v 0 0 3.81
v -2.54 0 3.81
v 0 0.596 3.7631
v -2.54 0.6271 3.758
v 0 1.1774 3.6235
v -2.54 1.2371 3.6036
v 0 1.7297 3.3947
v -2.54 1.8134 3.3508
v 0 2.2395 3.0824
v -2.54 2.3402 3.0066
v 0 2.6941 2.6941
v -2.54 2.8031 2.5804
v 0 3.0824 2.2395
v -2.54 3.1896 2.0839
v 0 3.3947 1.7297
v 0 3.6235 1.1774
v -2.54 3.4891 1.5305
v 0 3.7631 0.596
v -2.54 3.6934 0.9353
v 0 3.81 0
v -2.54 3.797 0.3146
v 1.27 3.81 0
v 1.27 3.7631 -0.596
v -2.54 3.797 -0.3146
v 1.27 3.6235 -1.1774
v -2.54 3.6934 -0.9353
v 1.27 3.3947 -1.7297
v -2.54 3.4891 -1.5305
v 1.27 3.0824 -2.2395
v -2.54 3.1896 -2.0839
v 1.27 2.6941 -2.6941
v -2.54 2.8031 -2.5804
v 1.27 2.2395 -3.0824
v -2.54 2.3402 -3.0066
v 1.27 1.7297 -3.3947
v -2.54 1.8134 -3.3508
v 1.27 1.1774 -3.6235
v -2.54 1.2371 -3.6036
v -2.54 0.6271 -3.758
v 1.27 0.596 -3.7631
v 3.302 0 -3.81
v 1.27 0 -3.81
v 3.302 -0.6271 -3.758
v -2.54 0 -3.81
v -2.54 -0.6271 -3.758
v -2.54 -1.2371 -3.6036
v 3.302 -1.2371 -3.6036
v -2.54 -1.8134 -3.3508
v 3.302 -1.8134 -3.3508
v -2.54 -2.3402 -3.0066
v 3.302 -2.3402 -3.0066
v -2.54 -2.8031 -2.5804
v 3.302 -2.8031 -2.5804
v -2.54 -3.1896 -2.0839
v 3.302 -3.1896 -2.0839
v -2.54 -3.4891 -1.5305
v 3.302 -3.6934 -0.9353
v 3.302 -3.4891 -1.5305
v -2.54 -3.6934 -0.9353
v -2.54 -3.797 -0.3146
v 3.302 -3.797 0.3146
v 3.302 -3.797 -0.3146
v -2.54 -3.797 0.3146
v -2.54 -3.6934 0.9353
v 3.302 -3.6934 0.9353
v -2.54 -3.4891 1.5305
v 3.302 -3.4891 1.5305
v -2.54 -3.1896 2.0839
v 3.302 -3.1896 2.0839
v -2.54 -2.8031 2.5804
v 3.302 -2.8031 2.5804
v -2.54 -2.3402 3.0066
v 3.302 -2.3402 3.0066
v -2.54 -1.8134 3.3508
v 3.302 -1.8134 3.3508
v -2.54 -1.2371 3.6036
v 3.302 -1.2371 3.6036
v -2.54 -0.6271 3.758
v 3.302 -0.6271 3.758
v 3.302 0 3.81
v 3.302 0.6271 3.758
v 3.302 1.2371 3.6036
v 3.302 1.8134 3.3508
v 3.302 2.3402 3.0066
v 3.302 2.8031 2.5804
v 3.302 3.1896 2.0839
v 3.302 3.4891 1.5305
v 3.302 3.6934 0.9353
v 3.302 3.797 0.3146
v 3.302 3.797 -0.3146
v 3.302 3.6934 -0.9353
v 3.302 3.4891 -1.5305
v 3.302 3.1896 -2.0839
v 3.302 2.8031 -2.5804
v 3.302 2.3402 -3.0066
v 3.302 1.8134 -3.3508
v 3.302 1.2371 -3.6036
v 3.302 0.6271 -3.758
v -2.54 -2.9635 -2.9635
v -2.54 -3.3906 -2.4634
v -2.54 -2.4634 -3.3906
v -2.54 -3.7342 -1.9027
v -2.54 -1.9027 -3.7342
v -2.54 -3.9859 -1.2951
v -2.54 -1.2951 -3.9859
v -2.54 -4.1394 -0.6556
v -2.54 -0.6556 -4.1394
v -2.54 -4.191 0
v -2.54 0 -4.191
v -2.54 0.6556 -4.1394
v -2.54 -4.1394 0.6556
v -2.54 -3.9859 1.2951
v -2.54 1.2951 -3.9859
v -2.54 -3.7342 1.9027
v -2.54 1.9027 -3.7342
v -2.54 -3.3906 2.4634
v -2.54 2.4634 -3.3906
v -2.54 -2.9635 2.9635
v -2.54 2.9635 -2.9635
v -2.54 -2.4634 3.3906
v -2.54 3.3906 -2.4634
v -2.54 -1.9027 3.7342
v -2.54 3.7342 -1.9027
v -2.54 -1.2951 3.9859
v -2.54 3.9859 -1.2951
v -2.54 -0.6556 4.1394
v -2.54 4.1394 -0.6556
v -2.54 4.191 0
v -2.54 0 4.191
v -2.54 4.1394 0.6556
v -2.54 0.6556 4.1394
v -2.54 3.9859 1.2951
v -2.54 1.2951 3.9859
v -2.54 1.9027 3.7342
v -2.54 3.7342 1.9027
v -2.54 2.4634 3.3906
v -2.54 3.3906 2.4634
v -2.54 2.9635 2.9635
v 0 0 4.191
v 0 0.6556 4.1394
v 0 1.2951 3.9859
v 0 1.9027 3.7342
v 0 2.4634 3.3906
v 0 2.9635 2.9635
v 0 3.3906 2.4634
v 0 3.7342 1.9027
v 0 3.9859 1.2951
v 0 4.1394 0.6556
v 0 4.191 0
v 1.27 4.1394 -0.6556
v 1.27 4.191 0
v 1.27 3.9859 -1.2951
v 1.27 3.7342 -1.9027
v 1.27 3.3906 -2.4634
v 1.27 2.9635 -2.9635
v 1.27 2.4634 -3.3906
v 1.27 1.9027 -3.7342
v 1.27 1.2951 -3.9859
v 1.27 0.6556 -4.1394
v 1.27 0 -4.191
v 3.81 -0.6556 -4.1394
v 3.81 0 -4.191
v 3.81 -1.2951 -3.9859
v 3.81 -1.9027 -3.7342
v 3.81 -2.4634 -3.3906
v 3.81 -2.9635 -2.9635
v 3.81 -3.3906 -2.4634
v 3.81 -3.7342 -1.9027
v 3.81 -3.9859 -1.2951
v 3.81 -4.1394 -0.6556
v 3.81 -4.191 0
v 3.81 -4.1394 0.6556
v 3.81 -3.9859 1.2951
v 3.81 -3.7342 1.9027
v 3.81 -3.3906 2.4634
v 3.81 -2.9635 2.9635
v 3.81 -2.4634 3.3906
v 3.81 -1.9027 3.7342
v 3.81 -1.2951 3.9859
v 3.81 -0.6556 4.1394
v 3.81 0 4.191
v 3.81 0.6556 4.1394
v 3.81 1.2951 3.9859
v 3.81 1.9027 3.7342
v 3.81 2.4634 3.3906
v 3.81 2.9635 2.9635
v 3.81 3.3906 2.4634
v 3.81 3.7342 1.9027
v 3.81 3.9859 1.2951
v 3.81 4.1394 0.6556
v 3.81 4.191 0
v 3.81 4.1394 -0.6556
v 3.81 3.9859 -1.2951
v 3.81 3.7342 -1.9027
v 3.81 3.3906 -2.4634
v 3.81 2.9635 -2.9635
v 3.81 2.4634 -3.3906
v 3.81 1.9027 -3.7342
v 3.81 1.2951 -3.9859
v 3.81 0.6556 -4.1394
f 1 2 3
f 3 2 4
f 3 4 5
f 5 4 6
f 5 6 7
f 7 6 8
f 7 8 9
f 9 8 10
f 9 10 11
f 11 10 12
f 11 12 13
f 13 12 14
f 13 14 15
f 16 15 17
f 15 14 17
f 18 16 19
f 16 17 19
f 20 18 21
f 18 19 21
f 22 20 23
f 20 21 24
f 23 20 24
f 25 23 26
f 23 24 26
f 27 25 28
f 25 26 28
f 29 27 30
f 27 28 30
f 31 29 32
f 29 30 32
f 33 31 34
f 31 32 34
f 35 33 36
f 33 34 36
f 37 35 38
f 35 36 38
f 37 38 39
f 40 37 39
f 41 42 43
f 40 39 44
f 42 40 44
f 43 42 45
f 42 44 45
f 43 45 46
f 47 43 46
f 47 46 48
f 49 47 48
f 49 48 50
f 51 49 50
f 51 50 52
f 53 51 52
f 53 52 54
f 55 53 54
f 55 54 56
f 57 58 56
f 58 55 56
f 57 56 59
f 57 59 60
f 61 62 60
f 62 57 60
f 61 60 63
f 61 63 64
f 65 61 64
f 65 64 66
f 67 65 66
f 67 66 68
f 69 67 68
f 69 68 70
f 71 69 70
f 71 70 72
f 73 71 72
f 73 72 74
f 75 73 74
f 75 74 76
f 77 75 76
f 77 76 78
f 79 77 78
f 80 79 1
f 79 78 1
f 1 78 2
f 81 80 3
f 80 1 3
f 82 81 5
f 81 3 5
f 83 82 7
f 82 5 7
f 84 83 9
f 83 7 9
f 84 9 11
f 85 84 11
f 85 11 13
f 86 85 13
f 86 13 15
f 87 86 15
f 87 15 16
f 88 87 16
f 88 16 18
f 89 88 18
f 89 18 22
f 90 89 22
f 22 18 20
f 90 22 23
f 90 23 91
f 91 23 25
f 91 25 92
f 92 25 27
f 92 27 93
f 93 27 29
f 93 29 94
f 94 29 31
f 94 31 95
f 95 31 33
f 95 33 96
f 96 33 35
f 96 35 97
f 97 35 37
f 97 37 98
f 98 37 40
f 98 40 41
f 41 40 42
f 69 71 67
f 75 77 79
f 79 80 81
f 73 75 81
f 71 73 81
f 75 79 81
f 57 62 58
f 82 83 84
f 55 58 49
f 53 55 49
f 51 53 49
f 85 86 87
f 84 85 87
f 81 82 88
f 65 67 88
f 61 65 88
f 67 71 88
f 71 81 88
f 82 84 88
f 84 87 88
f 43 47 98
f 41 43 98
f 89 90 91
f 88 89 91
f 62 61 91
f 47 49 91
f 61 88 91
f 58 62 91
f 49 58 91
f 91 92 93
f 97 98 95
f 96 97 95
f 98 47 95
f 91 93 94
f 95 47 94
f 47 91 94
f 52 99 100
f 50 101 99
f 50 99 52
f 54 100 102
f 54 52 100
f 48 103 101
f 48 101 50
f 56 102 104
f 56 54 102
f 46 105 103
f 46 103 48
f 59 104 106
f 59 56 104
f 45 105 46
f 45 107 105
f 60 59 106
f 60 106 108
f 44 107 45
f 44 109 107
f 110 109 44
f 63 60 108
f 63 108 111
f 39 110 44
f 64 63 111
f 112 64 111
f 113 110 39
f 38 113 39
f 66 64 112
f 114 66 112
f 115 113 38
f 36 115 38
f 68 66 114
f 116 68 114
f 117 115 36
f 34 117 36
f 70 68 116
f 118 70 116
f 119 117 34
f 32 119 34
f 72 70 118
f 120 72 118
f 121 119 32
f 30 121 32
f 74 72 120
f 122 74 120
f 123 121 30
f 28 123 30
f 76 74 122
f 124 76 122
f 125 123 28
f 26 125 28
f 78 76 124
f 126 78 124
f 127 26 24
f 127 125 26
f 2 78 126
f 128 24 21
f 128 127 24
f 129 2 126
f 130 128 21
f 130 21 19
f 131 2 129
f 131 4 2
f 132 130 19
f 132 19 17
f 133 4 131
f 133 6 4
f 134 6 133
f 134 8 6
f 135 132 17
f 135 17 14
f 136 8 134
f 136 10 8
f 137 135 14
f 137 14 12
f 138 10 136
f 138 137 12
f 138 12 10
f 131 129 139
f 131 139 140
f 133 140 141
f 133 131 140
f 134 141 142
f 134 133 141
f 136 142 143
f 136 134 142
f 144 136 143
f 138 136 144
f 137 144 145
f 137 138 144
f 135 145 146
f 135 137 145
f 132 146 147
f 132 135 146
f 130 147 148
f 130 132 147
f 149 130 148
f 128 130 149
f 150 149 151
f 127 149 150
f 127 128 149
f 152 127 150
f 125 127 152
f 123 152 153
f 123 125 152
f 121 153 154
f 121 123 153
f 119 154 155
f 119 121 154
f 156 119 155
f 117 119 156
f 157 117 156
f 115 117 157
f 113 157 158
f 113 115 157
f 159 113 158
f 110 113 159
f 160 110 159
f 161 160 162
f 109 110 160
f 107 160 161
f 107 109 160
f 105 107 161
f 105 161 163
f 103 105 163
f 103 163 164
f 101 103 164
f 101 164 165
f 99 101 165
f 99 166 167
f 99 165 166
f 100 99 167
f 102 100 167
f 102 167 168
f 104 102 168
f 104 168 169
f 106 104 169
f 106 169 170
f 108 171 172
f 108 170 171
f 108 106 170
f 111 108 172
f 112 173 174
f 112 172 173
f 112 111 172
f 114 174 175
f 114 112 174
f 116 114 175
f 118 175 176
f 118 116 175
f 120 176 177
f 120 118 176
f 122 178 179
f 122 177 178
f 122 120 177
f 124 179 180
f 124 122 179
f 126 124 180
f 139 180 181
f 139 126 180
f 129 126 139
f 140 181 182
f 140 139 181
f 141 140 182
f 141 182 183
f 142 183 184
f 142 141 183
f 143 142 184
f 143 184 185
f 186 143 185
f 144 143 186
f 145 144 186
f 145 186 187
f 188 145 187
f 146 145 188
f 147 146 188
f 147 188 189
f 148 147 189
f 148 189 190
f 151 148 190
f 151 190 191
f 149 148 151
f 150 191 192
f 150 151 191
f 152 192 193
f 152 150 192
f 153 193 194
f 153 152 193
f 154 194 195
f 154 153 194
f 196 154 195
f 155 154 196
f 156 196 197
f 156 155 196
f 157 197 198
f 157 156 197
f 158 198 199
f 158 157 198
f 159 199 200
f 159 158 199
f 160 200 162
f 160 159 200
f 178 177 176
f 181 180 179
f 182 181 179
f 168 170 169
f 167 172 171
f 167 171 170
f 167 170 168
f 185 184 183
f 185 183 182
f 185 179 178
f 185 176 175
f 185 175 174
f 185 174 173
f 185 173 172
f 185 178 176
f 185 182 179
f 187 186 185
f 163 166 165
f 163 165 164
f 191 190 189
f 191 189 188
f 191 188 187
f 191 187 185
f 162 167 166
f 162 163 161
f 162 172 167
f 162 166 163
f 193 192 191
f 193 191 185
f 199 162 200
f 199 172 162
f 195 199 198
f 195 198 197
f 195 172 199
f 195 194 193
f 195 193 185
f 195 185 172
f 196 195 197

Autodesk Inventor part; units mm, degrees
ref_plane "YZ Plane" through (0, 0, 0) normal (1, 0, 0) x (0, 1, 0)
ref_plane "XZ Plane" through (0, 0, 0) normal (0, 1, 0) x (-1, 0, 0)
ref_plane "XY Plane" through (0, 0, 0) normal (0, 0, 1) x (1, 0, 0)
sketch "Sketch1" plane through (0, 0, 0) normal (1, 0, 0) x (0, 1, 0)
  circle A0 centre (0, 0) radius 4.191
  circle A1 centre (0, 0) radius 3.81
  dimension "d0" = 8.382
  dimension "d1" = 7.62
extrude "Extrusion1" add sketch "Sketch1" along normal blind 1.27
sketch "Sketch2" plane through (0, 0, 0) normal (-1, 0, 0) x (0, 0, 1)
  circle A0 centre (0, 0) radius 4.191
  circle A1 centre (0, 0) radius 3.81
  dimension "d5" = 8.382
  dimension "d4" = 7.62
extrude "Extrusion2" add sketch "Sketch2" along normal blind 1.27
sketch "Sketch3" plane through (-1.27, 0, 0) normal (-1, 0, 0) x (0, 0, 1)
  circle A0 centre (0, 0) radius 4.191
  circle A1 centre (0, 0) radius 3.81
  dimension "d10" = 8.382
  dimension "d9" = 7.62
extrude "Extrusion3" add sketch "Sketch3" along normal blind 1.27
sketch "Sketch4" plane through (1.27, 0, 0) normal (1, 0, 0) x (0, 0, -1)
  circle A0 centre (0, 0) radius 4.191
  circle A1 centre (0, 0) radius 3.81
  dimension "d15" = 8.382
  dimension "d14" = 7.62
extrude "Extrusion4" add sketch "Sketch4" along normal blind 1.27
sketch "Sketch5" plane through (2.54, 0, 0) normal (1, 0, 0) x (0, 0, -1)
  circle A0 centre (0, 0) radius 4.191
  circle A1 centre (0, 0) radius 3.81
  dimension "d20" = 8.382
  dimension "d19" = 7.62
extrude "Extrusion5" add sketch "Sketch5" along normal blind 1.27
sketch "Sketch6" plane through (3.81, 0, 0) normal (1, 0, 0) x (0, 0, -1)
  circle A0 centre (0, 0) radius 3.81
extrude "Extrusion6" add sketch "Sketch6" against normal blind 0.508
properties part number "rond"
